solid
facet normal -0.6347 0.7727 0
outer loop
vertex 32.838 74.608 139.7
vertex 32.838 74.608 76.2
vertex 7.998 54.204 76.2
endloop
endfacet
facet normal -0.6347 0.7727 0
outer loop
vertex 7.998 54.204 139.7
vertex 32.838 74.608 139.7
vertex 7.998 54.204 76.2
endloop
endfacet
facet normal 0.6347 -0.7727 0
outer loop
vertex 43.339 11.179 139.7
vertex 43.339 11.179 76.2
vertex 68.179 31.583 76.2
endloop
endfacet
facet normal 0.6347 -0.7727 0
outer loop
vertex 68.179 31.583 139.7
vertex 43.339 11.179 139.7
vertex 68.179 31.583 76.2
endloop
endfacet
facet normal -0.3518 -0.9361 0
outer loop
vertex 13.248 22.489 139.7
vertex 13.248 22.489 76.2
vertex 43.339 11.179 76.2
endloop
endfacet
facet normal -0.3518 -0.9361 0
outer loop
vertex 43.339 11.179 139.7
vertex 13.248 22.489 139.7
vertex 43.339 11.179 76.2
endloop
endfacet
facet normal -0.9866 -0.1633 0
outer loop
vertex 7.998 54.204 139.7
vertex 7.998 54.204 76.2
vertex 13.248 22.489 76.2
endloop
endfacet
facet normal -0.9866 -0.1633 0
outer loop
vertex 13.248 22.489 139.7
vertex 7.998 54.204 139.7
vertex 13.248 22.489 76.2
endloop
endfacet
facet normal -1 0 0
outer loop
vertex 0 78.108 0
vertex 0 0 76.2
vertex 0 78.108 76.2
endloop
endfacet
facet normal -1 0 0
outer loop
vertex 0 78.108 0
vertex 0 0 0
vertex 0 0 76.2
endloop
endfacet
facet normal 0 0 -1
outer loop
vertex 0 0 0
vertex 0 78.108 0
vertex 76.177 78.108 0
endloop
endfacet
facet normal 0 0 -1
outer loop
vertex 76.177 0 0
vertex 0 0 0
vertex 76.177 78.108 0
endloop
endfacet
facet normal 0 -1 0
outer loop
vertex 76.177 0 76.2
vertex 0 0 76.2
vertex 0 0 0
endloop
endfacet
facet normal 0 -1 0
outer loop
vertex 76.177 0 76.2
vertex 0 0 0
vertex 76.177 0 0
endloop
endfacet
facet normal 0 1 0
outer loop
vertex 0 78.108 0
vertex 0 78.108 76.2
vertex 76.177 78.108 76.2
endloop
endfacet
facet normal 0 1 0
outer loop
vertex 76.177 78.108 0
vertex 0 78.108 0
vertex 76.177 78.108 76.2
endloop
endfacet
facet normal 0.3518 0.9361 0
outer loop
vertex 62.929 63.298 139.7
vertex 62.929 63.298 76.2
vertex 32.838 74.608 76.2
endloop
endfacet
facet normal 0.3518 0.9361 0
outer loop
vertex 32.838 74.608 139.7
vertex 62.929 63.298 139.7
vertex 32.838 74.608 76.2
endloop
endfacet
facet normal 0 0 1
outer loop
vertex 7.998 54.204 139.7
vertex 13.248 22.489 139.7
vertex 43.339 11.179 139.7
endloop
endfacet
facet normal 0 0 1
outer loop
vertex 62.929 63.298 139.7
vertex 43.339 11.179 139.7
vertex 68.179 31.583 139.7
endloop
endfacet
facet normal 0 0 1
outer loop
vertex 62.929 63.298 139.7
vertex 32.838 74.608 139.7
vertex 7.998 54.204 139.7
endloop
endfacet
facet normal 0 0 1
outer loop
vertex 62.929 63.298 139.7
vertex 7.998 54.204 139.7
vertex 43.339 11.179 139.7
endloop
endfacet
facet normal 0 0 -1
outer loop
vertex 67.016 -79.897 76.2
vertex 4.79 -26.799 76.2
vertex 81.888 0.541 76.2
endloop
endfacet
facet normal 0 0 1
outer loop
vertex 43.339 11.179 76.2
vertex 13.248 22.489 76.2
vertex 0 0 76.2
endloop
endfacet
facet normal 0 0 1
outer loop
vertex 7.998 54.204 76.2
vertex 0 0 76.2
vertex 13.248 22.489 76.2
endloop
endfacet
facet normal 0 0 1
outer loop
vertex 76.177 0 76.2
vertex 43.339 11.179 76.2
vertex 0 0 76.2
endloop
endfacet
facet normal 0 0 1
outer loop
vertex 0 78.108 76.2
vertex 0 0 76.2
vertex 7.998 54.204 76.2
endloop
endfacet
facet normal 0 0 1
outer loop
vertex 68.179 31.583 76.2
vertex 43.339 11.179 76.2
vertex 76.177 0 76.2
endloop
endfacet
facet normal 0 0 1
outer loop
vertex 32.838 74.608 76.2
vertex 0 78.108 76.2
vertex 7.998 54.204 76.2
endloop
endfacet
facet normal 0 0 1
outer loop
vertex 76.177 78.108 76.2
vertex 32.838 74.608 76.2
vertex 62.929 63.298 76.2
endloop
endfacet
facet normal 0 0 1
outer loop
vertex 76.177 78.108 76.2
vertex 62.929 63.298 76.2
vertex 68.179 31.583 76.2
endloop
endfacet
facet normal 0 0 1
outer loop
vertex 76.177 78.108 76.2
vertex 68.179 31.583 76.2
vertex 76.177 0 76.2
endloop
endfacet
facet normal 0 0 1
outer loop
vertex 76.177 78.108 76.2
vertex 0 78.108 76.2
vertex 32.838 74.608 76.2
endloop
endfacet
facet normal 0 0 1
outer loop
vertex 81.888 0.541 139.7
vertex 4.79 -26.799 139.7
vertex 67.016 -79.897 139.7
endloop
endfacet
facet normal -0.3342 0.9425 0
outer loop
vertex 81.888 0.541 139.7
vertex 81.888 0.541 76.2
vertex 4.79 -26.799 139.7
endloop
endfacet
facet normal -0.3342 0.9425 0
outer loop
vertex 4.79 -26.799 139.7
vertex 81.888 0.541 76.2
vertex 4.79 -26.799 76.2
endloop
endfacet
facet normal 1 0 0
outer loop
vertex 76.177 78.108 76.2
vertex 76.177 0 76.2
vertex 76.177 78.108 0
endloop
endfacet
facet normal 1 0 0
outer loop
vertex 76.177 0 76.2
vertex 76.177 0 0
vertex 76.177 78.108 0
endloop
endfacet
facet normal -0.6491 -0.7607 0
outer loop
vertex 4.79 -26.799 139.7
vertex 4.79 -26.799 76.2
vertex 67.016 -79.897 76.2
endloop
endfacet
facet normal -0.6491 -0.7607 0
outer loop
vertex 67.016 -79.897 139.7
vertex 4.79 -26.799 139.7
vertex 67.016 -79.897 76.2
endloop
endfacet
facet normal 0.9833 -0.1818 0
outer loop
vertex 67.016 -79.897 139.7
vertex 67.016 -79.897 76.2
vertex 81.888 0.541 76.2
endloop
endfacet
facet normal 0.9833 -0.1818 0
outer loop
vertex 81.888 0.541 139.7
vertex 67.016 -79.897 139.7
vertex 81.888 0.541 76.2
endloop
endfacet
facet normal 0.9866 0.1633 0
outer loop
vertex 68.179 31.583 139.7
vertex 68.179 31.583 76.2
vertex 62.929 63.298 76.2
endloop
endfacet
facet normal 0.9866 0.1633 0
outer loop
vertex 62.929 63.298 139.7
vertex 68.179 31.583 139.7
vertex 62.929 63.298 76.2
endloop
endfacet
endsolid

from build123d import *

# Parameters (mm, degrees)
F0_W     = 76.177008
F0_H     = 78.108393
F1_DEPTH = 25.4
F2_W     = 76.177008
F2_H     = 78.108393
F3_DEPTH = 50.8
F5_DEPTH = 63.5


with BuildPart() as f1:
    # F0 (on Top) → F1 (new body)
    with BuildSketch(Plane.XY):
        with Locations((38.088504, 39.054196)):
            Rectangle(F0_W, F0_H)
    extrude(amount=F1_DEPTH)

    # F2 (on face) → F3 (join)
    with BuildSketch(Plane.XY.offset(25.4)):
        with Locations((38.088504, 39.054196)):
            Rectangle(F2_W, F2_H)
    extrude(amount=F3_DEPTH)

    # F4 (on face) → F5 (join)
    with BuildSketch(Plane.XY.offset(76.2)):
        Polygon((4.790272, -26.799109), (67.016207, -79.89718), (81.887518, 0.541095), align=None)
        Polygon((13.248174, 22.489128), (43.338895, 11.178871), (68.179225, 31.583071), (62.928834, 63.297528), (32.838114, 74.607785), (7.997784, 54.203584), align=None)
    extrude(amount=F5_DEPTH)


solid = f1.part
